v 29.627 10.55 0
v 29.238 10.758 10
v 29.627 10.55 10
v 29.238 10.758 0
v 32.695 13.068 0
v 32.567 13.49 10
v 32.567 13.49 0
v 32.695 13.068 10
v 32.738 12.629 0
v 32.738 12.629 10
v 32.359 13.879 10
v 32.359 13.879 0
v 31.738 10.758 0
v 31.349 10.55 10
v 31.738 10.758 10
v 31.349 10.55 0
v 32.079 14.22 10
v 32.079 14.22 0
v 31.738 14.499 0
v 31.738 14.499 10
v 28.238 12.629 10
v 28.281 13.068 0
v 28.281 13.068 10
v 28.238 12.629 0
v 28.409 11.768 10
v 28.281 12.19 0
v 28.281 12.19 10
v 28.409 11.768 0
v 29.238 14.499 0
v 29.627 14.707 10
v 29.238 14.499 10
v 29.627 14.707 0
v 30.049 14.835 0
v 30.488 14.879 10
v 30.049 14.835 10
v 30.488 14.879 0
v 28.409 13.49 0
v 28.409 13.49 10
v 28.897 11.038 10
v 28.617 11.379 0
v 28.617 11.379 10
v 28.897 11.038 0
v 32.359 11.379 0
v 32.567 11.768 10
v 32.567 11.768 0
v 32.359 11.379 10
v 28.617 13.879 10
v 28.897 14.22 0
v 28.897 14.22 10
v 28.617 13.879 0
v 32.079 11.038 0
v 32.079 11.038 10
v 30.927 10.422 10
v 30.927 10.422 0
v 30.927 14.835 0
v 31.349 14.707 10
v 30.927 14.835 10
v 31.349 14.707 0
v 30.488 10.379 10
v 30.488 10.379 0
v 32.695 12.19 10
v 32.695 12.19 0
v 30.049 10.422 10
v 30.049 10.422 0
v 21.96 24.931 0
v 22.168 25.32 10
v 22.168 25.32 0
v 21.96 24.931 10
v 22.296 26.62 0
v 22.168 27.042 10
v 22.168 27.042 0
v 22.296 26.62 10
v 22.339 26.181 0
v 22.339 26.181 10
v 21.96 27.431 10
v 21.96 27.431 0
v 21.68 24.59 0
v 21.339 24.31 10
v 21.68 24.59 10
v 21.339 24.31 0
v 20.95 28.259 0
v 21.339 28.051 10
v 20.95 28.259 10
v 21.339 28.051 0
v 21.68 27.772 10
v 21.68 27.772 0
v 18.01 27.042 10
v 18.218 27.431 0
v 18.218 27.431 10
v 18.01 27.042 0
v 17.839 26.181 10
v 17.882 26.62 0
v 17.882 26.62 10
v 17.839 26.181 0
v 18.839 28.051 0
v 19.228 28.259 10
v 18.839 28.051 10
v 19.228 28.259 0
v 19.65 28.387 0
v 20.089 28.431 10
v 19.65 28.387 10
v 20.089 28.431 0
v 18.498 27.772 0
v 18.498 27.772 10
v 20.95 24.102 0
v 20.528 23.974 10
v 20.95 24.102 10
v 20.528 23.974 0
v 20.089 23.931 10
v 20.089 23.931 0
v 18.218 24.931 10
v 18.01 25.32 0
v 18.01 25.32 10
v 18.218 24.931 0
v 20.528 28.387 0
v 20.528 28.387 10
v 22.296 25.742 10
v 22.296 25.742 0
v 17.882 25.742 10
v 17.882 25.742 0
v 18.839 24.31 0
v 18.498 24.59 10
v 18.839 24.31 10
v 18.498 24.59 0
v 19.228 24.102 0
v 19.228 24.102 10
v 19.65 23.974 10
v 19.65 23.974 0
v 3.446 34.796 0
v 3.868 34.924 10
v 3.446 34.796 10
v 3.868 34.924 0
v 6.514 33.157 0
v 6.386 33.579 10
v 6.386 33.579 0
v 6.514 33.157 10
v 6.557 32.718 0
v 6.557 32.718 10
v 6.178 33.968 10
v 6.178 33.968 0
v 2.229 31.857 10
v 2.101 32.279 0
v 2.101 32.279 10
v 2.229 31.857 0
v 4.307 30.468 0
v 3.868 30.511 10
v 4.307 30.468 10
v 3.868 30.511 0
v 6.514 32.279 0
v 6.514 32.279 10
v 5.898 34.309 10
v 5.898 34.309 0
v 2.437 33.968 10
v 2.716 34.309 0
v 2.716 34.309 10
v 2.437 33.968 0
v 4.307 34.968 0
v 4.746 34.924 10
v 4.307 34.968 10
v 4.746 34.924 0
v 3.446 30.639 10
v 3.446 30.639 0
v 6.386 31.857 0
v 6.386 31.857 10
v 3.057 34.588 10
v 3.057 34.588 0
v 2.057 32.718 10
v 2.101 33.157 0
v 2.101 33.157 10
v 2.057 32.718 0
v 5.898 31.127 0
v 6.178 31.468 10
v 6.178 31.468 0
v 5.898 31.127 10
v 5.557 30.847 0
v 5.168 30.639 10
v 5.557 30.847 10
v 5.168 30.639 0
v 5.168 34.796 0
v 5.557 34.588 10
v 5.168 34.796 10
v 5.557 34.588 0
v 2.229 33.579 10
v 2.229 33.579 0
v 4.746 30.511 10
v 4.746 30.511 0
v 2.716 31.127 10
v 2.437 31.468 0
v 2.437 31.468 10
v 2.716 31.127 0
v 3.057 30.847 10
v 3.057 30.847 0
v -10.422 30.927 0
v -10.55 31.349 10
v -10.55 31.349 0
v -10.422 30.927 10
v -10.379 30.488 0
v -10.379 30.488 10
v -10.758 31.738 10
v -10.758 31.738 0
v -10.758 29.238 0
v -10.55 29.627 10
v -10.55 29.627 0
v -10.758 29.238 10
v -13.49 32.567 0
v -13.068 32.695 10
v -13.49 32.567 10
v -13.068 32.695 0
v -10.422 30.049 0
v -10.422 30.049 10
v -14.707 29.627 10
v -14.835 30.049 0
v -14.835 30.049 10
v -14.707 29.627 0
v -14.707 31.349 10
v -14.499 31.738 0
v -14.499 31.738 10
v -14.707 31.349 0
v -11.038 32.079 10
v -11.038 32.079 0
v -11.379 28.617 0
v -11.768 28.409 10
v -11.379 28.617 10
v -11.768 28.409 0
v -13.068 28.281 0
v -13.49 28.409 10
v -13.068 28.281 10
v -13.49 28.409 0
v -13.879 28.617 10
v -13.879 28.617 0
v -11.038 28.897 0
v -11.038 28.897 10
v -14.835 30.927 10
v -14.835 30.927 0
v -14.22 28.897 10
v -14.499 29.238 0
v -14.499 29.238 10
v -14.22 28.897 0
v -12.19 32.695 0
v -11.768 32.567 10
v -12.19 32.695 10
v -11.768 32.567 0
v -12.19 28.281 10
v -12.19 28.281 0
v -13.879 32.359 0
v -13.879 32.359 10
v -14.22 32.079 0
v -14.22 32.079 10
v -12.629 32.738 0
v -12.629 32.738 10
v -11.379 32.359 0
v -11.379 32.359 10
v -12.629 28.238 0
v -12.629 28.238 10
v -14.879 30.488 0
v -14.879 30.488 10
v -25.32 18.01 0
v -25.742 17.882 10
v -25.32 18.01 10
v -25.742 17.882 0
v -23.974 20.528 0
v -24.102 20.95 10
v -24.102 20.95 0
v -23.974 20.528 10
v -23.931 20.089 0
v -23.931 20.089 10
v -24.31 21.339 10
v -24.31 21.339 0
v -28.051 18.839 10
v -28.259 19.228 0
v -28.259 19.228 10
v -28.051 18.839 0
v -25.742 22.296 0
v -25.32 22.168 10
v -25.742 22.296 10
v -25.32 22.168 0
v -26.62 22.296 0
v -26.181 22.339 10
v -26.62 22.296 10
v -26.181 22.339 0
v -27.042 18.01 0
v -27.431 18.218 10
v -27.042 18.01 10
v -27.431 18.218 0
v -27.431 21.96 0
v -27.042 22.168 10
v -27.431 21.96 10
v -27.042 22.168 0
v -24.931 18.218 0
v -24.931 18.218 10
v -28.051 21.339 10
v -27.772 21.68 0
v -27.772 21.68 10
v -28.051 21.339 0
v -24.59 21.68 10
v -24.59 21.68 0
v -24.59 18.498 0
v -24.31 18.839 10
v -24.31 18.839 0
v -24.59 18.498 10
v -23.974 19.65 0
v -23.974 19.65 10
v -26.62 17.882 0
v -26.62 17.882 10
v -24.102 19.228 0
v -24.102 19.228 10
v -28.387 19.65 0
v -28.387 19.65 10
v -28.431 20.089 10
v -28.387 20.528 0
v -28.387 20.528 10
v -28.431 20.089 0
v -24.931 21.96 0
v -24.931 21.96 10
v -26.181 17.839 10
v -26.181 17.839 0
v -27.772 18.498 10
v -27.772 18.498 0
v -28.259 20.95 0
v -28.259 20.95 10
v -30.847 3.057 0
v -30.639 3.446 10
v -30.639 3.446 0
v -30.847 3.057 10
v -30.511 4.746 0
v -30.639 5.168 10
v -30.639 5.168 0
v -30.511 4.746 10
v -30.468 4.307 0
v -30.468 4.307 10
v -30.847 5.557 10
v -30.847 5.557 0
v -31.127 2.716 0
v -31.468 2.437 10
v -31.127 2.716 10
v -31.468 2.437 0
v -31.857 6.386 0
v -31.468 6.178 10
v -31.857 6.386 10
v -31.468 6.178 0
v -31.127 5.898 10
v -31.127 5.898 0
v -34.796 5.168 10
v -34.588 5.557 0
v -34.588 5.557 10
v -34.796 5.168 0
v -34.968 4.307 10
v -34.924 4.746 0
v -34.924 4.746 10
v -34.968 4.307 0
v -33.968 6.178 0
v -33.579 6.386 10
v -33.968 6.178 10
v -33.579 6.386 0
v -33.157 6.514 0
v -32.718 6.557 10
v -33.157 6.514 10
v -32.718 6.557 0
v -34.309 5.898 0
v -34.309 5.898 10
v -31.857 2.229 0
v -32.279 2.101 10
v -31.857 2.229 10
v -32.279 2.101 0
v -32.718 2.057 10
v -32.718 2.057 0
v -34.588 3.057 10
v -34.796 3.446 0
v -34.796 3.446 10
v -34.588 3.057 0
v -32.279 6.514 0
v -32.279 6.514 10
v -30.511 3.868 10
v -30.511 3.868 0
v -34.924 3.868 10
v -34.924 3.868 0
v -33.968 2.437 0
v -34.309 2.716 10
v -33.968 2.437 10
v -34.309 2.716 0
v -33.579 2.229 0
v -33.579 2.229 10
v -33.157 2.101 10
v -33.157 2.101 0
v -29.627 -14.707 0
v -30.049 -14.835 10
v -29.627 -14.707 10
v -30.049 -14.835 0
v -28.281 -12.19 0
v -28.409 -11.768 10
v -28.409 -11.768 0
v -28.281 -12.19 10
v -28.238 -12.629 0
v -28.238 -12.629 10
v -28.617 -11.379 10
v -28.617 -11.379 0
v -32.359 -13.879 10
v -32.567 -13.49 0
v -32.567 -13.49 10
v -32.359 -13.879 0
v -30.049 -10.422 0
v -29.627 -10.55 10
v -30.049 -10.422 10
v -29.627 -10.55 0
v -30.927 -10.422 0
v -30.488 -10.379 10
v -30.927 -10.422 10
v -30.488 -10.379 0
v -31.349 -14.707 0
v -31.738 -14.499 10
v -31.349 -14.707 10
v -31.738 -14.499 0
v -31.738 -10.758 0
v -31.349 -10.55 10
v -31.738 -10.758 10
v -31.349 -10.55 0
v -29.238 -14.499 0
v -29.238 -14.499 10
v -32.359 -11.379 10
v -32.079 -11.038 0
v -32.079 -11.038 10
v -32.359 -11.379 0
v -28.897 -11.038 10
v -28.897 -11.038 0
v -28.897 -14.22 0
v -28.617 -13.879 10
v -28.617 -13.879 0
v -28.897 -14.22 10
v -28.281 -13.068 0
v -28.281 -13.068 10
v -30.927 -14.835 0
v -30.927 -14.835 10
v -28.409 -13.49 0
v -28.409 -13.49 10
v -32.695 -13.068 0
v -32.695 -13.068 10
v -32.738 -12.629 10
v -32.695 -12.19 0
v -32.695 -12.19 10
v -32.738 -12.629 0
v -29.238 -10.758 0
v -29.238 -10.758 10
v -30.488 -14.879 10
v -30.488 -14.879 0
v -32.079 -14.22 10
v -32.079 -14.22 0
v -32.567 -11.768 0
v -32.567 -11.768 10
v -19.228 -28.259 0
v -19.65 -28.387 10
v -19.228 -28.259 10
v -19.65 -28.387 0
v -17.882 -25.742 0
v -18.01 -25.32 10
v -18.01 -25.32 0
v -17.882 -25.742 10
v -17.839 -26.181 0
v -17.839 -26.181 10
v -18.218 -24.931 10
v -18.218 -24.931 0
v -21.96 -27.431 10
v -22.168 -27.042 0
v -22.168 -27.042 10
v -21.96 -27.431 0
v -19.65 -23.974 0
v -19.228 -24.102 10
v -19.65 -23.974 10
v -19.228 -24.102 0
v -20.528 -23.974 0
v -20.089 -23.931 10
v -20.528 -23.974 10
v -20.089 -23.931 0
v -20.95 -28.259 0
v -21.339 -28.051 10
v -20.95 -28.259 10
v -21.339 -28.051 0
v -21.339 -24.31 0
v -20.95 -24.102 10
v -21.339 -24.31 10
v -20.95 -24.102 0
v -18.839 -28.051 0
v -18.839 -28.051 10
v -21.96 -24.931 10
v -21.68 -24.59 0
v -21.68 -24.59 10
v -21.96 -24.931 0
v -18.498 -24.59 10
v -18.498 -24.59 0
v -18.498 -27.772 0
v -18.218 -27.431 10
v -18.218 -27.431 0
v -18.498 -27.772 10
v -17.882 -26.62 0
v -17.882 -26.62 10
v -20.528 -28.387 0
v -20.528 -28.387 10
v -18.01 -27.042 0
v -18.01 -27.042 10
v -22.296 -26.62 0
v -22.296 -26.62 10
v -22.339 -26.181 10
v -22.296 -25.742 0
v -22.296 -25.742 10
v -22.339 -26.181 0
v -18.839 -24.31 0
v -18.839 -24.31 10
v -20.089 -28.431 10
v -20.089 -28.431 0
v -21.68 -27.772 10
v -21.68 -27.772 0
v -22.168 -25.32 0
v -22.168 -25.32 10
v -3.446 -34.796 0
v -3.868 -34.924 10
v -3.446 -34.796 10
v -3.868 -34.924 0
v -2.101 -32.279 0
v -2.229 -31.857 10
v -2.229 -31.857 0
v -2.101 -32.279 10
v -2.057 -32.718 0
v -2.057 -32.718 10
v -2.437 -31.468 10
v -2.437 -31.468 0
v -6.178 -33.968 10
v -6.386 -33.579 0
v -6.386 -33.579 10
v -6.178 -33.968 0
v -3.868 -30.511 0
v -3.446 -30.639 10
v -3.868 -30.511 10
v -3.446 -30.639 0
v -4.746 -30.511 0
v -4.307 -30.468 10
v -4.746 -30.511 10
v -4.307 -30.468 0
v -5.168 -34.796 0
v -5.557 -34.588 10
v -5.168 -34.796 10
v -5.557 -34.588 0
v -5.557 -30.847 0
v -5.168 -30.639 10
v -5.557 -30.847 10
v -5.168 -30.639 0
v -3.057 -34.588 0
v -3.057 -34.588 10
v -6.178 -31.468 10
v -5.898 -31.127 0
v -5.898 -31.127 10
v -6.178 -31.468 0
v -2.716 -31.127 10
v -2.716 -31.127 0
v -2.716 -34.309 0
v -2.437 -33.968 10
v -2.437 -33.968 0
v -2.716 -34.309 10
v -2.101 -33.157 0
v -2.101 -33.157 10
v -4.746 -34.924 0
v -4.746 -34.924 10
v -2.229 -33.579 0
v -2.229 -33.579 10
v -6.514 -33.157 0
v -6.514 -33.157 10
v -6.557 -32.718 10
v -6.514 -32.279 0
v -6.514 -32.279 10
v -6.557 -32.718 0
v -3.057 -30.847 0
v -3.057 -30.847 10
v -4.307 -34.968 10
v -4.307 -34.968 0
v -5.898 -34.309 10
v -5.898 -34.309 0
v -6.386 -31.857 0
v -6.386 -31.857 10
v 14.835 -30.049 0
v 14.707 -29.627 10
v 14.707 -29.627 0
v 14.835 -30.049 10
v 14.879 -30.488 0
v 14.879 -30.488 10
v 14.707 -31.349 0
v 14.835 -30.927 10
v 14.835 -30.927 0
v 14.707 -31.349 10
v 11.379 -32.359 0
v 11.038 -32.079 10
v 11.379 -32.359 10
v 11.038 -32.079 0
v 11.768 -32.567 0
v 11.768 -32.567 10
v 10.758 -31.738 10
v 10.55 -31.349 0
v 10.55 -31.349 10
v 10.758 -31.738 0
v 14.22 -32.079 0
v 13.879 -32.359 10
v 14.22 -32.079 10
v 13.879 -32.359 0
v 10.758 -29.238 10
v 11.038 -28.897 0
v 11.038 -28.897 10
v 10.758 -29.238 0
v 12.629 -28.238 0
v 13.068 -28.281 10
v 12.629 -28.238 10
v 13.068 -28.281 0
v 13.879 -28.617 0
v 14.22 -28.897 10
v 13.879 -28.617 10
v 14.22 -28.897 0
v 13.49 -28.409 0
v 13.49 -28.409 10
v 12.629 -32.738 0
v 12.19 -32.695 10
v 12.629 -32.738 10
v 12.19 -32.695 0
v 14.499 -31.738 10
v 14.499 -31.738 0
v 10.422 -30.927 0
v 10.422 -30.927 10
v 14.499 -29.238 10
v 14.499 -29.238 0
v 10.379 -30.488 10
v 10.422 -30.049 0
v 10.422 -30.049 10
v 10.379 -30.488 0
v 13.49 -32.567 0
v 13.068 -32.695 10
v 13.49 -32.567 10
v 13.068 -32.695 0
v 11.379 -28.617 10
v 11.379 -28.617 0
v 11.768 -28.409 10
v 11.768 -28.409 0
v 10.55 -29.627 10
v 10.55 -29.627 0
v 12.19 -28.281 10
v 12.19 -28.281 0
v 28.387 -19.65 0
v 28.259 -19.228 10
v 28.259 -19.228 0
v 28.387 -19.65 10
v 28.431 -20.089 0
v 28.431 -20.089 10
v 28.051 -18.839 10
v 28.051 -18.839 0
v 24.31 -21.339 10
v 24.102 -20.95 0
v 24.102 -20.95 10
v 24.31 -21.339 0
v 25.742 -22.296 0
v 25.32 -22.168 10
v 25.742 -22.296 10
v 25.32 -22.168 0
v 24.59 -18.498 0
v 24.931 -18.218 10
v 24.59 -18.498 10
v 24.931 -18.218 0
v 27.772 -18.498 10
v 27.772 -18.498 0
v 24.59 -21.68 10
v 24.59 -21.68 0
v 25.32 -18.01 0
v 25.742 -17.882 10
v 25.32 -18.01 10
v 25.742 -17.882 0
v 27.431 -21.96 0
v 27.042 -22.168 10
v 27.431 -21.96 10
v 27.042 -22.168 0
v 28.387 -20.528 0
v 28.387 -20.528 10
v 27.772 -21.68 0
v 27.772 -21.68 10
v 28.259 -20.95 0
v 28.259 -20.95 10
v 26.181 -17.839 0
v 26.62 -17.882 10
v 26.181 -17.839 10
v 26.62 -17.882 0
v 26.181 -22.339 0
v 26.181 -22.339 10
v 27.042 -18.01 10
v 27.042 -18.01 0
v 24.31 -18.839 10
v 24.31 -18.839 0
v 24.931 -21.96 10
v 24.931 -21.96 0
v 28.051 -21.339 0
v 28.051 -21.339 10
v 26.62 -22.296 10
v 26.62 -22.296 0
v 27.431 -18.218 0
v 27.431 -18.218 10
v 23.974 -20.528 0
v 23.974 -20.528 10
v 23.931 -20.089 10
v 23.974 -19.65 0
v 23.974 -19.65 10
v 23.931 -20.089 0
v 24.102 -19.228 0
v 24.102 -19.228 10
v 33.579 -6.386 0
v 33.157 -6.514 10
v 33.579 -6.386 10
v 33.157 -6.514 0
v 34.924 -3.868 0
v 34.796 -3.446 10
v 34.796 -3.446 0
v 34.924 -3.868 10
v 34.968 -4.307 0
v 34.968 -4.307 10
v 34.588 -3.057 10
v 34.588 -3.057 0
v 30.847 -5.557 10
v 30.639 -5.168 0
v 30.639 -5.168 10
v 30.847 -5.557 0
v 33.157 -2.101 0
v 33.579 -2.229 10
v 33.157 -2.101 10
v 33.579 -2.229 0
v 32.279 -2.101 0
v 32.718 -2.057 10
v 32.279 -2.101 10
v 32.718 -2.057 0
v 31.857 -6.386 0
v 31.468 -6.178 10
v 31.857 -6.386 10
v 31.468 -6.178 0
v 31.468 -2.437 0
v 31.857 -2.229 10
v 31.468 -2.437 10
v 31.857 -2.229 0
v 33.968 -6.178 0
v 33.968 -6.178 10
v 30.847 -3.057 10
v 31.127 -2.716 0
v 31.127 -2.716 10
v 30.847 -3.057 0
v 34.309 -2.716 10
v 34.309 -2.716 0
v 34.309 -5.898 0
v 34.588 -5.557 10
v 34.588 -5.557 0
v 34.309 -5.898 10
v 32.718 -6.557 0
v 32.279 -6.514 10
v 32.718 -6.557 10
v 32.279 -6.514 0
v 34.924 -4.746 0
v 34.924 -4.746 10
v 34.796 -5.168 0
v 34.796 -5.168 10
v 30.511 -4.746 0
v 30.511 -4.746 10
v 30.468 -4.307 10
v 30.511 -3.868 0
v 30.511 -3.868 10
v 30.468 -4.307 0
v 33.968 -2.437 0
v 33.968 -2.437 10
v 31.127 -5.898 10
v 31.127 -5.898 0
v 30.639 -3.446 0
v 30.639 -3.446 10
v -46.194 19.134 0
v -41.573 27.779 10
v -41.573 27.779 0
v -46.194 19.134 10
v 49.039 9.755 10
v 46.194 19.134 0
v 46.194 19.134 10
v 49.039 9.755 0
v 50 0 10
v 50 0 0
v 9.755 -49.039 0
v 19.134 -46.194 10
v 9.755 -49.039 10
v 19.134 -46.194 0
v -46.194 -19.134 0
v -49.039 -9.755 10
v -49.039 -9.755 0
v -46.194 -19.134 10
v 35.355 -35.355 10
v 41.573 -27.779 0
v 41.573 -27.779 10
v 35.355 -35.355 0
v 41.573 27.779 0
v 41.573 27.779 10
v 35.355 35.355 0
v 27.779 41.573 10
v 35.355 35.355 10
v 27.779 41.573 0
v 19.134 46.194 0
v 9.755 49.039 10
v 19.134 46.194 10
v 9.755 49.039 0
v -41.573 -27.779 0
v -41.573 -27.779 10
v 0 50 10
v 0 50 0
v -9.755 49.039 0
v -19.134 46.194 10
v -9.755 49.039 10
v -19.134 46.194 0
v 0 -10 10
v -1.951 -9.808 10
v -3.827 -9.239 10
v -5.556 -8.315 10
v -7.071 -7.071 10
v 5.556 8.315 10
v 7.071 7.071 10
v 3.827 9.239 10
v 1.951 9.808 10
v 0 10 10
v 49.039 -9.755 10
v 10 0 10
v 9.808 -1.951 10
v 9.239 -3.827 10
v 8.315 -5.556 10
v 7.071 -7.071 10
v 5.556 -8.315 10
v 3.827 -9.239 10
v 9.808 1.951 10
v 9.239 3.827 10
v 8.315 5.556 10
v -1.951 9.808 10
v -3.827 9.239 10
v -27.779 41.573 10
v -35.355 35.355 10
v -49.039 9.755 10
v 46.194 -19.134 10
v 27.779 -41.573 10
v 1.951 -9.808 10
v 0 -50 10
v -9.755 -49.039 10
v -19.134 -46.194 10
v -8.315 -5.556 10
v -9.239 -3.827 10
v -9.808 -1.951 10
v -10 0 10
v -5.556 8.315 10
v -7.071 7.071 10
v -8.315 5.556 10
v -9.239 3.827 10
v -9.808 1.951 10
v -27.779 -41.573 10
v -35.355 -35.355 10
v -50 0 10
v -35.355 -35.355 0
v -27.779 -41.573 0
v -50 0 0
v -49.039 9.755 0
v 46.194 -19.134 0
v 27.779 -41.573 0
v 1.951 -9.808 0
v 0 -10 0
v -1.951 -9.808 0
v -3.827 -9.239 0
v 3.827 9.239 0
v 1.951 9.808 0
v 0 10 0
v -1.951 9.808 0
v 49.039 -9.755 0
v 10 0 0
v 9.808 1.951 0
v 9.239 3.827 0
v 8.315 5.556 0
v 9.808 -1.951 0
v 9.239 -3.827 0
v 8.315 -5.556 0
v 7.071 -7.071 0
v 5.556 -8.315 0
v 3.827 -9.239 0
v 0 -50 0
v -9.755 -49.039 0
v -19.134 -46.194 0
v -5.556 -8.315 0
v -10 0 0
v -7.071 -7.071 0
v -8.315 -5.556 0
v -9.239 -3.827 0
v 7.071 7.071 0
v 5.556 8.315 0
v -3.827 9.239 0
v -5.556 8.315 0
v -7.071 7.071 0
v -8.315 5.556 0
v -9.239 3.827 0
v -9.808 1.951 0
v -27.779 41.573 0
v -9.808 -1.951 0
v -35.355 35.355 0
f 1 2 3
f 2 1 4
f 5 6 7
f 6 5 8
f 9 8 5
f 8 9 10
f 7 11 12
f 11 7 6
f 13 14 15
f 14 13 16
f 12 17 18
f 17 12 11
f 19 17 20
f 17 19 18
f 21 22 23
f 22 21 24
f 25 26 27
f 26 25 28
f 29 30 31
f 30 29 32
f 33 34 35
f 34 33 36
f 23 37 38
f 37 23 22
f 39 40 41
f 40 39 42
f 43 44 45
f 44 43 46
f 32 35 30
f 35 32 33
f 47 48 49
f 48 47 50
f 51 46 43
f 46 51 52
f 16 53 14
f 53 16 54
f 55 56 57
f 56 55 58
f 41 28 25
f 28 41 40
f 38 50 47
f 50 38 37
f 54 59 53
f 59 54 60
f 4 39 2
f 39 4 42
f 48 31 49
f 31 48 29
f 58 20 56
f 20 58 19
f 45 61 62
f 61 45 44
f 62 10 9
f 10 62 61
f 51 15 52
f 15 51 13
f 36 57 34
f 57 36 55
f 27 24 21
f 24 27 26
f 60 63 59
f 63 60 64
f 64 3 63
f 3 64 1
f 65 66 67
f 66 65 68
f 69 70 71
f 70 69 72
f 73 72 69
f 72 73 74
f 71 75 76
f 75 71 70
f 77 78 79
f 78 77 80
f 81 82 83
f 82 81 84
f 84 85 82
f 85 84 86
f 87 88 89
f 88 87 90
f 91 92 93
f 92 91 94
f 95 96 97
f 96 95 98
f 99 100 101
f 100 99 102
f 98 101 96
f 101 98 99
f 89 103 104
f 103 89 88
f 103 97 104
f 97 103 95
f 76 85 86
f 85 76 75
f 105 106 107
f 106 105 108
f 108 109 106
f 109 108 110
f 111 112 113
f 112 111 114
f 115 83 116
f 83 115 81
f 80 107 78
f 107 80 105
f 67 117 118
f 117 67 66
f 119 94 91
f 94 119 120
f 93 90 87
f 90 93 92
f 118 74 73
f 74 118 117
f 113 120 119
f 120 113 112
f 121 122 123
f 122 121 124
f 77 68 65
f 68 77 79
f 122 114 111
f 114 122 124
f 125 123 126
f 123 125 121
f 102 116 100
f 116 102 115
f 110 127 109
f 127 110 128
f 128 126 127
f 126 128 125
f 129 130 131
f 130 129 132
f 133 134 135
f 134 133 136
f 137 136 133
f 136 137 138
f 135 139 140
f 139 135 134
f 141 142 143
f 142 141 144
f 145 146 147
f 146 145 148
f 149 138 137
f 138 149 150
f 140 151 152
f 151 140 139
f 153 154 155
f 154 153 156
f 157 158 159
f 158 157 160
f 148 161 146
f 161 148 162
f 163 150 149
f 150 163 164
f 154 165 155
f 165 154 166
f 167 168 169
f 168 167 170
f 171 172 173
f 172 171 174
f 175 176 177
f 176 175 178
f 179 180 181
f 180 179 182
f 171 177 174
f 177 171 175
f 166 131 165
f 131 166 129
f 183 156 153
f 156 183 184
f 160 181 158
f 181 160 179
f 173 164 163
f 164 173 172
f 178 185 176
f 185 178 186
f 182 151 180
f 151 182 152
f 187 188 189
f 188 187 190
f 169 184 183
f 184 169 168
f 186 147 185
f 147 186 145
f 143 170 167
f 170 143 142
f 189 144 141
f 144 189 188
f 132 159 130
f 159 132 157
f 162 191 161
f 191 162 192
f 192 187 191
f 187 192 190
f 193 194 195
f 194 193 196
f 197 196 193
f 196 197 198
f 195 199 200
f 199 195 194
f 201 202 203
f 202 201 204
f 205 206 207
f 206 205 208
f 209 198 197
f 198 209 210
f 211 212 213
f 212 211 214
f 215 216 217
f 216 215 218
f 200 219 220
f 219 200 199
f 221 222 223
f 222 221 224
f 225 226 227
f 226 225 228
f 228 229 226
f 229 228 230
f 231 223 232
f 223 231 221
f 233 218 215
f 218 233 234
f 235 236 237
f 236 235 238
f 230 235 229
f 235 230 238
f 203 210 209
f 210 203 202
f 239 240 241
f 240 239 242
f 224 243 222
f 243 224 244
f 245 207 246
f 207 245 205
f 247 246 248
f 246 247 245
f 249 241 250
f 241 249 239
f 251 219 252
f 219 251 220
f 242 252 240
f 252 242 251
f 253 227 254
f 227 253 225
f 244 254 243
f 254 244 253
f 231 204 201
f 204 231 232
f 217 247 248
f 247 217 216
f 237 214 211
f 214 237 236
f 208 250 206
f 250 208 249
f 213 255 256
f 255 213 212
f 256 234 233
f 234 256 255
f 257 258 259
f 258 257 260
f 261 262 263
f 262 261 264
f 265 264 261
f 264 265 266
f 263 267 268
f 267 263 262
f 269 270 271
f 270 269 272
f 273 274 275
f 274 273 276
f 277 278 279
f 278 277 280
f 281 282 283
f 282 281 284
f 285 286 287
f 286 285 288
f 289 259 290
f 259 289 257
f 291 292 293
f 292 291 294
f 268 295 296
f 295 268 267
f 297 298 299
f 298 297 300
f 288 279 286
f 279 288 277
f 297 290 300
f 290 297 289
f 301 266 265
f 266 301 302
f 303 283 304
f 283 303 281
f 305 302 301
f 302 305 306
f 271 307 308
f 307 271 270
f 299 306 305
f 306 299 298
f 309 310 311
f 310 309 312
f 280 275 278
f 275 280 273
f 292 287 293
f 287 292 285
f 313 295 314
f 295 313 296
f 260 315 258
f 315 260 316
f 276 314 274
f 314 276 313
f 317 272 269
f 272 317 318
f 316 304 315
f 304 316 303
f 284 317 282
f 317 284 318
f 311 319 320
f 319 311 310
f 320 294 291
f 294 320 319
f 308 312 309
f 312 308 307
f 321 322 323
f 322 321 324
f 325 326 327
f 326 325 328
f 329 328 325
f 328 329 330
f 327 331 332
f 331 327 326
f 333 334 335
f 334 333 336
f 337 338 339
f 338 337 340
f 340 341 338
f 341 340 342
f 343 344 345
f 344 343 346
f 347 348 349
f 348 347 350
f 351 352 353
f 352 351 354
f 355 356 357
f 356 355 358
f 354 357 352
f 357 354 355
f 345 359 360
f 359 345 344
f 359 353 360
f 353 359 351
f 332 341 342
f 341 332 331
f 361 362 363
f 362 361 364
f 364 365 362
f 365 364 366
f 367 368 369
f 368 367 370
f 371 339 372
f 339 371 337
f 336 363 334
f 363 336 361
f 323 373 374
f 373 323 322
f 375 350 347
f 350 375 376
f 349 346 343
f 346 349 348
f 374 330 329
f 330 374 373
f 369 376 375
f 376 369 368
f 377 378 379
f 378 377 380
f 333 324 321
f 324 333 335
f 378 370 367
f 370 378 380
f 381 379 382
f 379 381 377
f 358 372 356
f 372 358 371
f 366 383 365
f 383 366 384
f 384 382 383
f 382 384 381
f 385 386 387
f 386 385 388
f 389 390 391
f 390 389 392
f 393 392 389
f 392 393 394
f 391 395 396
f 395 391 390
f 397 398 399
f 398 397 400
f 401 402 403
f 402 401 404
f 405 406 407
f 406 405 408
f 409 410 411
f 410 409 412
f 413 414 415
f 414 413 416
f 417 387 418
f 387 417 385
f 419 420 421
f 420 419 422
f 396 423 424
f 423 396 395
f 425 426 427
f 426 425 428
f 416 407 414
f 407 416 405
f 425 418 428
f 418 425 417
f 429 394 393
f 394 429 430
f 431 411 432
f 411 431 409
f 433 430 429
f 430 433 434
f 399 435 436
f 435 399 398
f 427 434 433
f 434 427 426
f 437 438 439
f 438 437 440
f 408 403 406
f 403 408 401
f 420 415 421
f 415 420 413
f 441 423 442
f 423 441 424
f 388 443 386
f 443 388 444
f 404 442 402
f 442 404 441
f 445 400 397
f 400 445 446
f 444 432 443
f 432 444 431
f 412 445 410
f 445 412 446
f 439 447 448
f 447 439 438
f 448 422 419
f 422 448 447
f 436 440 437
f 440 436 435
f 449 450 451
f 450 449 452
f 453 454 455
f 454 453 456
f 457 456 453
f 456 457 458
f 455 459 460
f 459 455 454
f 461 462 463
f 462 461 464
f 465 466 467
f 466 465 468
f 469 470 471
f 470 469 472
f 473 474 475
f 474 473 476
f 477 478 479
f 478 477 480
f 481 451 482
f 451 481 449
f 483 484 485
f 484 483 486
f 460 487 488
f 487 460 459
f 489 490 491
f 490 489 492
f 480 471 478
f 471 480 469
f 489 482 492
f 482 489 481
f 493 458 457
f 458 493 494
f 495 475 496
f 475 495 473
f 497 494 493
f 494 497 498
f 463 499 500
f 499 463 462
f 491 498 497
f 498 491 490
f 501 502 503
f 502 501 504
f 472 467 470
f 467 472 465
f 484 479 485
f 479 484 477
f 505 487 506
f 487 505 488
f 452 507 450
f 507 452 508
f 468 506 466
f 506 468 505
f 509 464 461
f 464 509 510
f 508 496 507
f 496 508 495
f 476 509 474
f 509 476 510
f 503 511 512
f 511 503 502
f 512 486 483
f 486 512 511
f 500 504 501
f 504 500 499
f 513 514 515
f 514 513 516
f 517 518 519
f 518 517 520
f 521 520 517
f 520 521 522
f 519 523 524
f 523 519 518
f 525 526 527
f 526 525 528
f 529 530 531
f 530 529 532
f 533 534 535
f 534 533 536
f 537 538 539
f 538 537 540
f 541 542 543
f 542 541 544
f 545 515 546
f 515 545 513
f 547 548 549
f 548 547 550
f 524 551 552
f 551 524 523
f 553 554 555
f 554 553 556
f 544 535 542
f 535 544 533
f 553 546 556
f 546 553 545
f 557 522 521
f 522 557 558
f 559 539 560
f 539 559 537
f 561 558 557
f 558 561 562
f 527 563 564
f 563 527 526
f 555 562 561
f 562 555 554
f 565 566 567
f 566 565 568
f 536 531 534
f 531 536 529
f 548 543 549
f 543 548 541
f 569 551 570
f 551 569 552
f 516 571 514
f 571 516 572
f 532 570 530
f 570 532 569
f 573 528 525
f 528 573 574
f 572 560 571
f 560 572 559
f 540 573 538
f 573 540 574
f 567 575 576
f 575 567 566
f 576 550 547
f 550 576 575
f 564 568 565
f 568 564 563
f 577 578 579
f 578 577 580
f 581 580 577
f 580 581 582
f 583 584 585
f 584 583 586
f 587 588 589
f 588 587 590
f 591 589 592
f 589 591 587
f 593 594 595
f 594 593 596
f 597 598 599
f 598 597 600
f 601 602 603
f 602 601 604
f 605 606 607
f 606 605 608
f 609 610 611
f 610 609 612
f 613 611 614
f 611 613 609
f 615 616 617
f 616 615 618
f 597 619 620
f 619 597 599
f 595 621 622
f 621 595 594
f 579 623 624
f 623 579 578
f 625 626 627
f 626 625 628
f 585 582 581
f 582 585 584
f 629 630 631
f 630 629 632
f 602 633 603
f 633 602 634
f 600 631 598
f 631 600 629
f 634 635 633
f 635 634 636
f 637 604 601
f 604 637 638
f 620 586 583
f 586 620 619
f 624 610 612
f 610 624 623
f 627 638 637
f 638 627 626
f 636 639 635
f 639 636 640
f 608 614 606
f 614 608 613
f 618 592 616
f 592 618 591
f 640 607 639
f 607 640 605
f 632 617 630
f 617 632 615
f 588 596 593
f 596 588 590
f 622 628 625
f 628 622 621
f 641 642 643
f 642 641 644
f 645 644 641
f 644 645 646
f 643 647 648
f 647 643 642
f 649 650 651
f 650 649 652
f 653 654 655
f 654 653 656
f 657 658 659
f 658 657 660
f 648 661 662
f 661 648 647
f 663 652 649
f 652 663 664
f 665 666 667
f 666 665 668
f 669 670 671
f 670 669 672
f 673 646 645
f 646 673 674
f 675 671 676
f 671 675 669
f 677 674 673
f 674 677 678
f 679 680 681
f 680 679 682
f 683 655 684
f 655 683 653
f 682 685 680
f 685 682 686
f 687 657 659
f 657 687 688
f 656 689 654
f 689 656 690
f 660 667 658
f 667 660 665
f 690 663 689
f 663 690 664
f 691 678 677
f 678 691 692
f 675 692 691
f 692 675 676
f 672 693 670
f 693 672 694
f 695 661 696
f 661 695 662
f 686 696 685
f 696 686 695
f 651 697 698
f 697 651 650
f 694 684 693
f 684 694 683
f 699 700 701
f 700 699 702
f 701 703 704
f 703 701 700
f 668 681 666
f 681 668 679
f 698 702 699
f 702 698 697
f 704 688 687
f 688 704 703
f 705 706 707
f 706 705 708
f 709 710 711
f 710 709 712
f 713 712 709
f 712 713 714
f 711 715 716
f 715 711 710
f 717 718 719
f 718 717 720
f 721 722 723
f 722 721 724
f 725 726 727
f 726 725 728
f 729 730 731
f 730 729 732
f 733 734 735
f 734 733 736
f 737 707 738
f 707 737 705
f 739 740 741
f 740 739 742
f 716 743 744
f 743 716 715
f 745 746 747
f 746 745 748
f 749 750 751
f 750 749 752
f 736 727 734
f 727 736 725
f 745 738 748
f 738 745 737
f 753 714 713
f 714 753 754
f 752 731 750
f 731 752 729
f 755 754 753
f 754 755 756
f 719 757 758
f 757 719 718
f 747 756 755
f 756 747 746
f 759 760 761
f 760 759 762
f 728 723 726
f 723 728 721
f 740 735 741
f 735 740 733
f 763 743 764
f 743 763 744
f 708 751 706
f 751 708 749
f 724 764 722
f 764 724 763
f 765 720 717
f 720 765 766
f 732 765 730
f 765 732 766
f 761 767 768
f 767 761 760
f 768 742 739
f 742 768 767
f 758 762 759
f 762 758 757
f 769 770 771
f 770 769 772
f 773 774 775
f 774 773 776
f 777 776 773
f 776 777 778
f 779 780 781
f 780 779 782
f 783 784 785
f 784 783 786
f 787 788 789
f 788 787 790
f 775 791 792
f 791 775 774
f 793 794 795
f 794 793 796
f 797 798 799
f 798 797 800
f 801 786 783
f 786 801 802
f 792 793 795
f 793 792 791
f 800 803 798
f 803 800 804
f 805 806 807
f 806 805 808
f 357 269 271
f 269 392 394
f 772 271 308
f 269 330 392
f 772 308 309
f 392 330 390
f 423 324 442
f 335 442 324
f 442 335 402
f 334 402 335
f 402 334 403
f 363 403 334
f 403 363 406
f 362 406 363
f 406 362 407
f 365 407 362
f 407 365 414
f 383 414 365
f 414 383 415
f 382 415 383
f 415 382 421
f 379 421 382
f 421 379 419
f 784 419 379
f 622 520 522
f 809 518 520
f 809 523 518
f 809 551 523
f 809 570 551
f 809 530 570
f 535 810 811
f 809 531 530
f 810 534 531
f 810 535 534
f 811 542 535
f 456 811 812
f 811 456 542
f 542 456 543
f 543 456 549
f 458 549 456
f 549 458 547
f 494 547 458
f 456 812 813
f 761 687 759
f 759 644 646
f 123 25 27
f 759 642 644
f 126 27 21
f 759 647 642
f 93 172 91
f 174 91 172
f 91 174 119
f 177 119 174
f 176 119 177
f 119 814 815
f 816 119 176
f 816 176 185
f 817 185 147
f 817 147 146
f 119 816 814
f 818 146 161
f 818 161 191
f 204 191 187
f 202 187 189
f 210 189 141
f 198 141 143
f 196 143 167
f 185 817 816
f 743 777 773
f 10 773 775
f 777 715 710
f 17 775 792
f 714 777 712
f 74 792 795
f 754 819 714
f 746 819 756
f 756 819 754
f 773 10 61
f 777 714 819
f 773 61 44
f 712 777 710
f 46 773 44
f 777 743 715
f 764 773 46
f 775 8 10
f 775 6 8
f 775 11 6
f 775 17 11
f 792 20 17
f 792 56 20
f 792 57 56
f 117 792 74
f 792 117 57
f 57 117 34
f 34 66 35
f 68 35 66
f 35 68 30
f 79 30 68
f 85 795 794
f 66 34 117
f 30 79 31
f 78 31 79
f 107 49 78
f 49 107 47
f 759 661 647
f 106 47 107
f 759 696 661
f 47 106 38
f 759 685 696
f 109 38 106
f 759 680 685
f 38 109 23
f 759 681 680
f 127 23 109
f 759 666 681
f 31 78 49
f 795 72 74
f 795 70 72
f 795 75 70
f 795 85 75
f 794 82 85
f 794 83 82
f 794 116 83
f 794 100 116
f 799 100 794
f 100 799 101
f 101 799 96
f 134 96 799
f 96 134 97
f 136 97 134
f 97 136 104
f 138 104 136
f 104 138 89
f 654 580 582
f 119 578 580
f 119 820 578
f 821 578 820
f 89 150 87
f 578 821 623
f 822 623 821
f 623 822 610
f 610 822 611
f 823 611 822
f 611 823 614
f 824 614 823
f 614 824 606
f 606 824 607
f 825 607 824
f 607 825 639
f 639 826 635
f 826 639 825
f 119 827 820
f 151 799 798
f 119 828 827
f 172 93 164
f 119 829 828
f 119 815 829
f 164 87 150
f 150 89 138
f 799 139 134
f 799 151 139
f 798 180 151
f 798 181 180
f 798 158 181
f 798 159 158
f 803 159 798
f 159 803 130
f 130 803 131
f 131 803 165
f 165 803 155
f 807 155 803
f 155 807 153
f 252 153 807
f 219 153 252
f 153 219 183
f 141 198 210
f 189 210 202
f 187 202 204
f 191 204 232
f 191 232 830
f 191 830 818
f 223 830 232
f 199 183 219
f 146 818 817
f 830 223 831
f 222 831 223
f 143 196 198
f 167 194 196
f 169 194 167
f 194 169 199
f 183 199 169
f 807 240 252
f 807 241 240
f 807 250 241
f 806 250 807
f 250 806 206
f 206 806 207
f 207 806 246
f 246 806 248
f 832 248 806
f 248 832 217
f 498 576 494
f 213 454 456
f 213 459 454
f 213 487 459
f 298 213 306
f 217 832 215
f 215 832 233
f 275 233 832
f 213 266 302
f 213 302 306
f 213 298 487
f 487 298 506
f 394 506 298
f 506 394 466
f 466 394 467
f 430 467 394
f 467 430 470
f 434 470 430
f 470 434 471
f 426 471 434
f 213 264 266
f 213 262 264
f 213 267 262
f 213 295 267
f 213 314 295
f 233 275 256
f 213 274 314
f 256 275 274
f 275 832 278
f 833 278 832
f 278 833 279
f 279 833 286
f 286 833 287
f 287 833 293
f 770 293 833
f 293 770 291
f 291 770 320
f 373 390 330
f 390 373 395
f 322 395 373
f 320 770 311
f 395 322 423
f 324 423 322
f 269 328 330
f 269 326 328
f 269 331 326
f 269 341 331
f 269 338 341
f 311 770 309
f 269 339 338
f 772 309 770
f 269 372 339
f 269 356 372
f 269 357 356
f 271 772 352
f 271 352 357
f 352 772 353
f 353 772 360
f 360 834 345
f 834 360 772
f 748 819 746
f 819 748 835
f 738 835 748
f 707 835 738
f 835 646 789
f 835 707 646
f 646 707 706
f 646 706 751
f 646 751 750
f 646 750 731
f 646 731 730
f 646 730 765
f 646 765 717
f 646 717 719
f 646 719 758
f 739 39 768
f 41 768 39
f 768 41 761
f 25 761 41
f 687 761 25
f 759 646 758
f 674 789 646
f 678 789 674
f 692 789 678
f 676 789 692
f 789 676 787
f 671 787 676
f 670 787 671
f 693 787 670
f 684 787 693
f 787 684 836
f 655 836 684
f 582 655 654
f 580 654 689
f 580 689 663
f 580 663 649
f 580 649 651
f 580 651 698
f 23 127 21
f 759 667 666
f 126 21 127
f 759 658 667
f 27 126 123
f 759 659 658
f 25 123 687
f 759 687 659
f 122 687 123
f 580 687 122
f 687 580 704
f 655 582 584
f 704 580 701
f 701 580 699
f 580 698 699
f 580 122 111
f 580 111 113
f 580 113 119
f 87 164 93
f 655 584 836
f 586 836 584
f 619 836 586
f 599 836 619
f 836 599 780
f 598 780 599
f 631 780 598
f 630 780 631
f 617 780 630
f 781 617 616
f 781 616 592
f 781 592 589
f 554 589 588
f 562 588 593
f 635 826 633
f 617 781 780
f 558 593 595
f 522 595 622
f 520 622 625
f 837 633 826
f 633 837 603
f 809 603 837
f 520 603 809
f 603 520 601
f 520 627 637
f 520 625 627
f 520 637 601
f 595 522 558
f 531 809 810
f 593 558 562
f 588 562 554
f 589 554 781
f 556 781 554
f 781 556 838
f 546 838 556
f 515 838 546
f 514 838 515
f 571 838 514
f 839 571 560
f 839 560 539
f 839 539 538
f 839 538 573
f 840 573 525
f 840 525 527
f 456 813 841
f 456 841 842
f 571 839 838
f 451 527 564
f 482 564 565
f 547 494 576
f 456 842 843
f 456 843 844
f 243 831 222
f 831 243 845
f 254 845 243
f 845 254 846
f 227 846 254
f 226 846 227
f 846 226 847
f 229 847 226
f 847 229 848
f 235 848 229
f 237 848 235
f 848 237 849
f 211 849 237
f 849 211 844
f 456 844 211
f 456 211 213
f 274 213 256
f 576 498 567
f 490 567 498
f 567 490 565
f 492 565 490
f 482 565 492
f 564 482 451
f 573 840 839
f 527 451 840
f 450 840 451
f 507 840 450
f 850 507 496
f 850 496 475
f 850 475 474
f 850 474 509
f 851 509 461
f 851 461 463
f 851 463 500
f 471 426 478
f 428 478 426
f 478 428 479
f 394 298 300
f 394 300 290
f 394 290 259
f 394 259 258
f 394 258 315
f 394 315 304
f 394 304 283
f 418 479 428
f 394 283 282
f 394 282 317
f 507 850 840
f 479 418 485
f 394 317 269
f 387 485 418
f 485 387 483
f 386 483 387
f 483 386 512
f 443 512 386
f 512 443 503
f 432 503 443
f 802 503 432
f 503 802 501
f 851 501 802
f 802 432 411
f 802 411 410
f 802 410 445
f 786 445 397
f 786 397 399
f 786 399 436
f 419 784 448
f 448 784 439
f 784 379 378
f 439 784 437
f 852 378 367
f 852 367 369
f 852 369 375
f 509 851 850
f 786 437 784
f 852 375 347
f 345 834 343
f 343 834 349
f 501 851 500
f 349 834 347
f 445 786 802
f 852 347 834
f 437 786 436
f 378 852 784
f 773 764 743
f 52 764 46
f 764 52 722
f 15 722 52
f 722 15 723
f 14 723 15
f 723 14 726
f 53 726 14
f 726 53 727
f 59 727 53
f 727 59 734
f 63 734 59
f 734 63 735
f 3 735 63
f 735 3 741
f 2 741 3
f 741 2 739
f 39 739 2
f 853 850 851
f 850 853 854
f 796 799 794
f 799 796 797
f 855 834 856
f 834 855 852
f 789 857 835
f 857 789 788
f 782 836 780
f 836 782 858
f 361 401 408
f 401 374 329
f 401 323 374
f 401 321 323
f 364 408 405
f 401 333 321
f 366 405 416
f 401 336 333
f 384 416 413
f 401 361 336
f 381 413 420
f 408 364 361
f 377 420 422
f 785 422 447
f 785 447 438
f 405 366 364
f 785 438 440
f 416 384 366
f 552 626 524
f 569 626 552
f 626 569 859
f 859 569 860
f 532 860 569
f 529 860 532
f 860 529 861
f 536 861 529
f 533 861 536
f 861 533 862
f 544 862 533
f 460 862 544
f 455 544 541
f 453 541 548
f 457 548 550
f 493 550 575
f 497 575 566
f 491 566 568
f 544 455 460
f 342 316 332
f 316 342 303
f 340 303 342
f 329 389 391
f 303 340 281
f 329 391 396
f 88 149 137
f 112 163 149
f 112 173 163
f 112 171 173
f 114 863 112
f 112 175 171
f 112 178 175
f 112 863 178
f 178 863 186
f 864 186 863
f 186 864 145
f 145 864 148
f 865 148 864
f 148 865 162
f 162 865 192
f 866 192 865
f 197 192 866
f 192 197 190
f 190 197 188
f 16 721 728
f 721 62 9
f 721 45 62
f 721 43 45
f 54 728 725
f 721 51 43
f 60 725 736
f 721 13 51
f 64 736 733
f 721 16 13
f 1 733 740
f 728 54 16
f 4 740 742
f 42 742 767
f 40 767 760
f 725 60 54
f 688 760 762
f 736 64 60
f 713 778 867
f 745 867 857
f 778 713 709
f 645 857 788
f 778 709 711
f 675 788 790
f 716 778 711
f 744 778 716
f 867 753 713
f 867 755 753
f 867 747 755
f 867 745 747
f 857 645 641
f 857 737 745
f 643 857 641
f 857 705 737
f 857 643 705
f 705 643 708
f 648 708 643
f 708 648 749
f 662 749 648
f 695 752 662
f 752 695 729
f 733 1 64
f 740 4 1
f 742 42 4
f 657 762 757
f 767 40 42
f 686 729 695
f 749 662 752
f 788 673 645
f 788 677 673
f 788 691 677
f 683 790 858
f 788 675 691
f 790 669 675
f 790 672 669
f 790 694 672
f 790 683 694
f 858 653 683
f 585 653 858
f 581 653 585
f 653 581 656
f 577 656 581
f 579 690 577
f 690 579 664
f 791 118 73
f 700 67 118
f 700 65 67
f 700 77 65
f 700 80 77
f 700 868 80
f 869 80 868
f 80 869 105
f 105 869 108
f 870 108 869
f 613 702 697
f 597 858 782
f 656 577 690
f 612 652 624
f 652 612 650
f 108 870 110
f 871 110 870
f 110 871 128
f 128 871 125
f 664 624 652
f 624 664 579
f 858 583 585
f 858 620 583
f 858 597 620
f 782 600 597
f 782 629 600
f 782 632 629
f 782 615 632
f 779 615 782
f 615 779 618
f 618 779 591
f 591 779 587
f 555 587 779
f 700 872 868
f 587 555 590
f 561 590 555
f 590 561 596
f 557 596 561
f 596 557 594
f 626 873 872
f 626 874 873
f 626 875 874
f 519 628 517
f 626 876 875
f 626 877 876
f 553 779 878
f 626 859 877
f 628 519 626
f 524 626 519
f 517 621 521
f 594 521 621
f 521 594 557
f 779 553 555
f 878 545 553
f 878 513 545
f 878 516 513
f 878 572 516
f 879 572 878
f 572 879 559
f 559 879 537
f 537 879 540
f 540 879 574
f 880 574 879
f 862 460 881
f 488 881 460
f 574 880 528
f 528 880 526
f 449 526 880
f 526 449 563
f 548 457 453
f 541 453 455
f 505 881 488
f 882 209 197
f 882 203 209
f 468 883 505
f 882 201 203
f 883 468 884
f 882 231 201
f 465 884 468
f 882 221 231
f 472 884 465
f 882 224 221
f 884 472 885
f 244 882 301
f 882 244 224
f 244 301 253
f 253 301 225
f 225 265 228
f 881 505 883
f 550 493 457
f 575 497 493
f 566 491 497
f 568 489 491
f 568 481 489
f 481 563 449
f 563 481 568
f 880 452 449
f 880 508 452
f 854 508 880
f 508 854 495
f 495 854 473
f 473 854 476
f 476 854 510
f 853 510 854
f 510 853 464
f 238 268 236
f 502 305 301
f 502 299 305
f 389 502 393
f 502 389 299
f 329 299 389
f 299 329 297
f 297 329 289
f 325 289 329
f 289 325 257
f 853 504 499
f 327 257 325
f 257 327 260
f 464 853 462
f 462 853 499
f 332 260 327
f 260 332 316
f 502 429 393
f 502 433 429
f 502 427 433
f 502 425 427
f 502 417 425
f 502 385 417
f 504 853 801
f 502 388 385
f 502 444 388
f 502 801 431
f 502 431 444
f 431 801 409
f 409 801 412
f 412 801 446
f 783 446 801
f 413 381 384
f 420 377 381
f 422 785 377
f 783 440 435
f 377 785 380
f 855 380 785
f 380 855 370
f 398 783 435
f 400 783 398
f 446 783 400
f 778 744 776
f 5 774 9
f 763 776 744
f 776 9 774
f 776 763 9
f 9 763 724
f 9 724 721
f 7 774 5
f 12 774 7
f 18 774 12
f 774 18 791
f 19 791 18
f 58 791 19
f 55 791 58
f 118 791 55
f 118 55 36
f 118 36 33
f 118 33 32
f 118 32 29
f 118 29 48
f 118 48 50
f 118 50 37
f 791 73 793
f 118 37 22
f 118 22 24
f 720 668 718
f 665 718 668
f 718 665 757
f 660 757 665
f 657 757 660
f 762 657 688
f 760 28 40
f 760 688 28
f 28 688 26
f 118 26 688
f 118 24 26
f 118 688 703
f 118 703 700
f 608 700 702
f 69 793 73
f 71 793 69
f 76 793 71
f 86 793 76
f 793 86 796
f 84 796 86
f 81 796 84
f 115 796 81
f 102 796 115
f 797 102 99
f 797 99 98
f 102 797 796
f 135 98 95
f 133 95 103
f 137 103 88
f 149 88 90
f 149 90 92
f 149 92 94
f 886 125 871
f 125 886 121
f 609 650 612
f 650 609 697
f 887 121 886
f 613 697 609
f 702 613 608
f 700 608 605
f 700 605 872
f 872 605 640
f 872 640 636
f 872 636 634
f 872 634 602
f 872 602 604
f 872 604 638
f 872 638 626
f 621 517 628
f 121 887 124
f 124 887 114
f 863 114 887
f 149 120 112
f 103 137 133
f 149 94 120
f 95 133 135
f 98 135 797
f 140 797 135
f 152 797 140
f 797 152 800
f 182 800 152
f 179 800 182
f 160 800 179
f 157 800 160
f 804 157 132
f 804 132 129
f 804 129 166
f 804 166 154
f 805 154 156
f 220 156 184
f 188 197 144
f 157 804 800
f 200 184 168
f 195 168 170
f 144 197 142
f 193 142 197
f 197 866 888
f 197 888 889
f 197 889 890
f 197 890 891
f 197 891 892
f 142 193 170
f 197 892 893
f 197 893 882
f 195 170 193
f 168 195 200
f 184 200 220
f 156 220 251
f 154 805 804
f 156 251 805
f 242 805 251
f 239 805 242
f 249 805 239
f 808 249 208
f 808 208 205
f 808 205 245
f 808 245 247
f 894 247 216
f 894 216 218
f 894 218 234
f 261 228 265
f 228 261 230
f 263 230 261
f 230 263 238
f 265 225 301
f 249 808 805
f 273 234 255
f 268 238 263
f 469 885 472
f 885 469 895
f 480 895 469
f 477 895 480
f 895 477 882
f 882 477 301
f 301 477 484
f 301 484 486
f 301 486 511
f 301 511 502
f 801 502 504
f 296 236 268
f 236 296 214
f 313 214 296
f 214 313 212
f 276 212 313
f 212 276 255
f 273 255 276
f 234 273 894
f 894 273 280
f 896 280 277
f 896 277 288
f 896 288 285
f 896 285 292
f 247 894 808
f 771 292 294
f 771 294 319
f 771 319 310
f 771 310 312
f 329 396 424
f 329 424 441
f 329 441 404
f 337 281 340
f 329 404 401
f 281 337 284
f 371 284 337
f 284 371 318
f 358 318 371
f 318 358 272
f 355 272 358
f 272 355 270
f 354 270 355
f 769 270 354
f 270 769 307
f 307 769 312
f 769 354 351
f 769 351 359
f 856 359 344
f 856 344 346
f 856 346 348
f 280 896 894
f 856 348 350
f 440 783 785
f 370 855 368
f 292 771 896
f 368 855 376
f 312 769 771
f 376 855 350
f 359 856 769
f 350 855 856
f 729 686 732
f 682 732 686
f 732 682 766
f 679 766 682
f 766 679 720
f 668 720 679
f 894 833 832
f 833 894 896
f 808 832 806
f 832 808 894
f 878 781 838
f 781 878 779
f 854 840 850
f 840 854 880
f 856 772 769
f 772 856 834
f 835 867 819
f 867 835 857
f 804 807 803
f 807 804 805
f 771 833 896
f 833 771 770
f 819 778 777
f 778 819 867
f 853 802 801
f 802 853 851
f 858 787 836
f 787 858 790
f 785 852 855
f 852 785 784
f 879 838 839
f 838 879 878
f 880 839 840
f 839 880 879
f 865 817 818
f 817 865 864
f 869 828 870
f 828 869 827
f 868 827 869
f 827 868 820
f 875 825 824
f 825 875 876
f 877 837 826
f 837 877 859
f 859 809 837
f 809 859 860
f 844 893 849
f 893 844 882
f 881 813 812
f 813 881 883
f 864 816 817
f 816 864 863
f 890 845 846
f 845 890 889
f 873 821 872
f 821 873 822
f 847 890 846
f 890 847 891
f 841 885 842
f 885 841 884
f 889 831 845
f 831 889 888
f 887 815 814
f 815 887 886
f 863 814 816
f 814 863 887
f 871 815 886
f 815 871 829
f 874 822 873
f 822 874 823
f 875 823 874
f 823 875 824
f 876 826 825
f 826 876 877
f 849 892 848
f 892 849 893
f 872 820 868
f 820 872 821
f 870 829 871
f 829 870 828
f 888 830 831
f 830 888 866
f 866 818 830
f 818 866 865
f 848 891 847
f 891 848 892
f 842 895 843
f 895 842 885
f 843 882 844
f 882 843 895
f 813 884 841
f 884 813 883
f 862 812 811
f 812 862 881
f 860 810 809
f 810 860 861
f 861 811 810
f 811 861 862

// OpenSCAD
$fn = 32;

// ----------------------------------------------------------------------
// Flange Ø100 x 10
// 12 holes on a Ø66 bolt circle, bolted joints
// ----------------------------------------------------------------------

// --- parameters (mm) ---
flange_d = 100;    // outside diameter of the flange
thickness = 10;    // flange thickness
holes = 12;        // number of bolt holes
pcd = 66;          // bolt circle diameter
start_deg = 22.5;  // angle of the first hole, from +X
hole_d = 4.5;      // bolt hole diameter
bore_d = 20;       // central through bore
hub_d = 32;        // hub outside diameter
hub_h = 0;         // hub height above the flange face (0 = no hub)

// --- derived feature positions (mm) ---
height = thickness + hub_h;  // = 10   overall height of the part
pcd_r = pcd / 2;             // = 33   bolt circle radius
hole_step = 360 / holes;     // = 30   angular pitch
feature_centers = [
  [pcd_r * cos(start_deg + 0 * hole_step), pcd_r * sin(start_deg + 0 * hole_step)],
  [pcd_r * cos(start_deg + 1 * hole_step), pcd_r * sin(start_deg + 1 * hole_step)],
  [pcd_r * cos(start_deg + 2 * hole_step), pcd_r * sin(start_deg + 2 * hole_step)],
  [pcd_r * cos(start_deg + 3 * hole_step), pcd_r * sin(start_deg + 3 * hole_step)],
  [pcd_r * cos(start_deg + 4 * hole_step), pcd_r * sin(start_deg + 4 * hole_step)],
  [pcd_r * cos(start_deg + 5 * hole_step), pcd_r * sin(start_deg + 5 * hole_step)],
  [pcd_r * cos(start_deg + 6 * hole_step), pcd_r * sin(start_deg + 6 * hole_step)],
  [pcd_r * cos(start_deg + 7 * hole_step), pcd_r * sin(start_deg + 7 * hole_step)],
  [pcd_r * cos(start_deg + 8 * hole_step), pcd_r * sin(start_deg + 8 * hole_step)],
  [pcd_r * cos(start_deg + 9 * hole_step), pcd_r * sin(start_deg + 9 * hole_step)],
  [pcd_r * cos(start_deg + 10 * hole_step), pcd_r * sin(start_deg + 10 * hole_step)],
  [pcd_r * cos(start_deg + 11 * hole_step), pcd_r * sin(start_deg + 11 * hole_step)]
];   // bolt hole centres on the pitch circle

// flange disc, every hole and the bore cut straight through
difference() {
  union() {
    cylinder(d = flange_d, h = thickness);
  }
  translate([0, 0, -1]) cylinder(d = bore_d, h = height + 2);  // bore, through
  for (centre = feature_centers)
    translate([centre[0], centre[1], -1]) cylinder(d = hole_d, h = thickness + 2);
}
